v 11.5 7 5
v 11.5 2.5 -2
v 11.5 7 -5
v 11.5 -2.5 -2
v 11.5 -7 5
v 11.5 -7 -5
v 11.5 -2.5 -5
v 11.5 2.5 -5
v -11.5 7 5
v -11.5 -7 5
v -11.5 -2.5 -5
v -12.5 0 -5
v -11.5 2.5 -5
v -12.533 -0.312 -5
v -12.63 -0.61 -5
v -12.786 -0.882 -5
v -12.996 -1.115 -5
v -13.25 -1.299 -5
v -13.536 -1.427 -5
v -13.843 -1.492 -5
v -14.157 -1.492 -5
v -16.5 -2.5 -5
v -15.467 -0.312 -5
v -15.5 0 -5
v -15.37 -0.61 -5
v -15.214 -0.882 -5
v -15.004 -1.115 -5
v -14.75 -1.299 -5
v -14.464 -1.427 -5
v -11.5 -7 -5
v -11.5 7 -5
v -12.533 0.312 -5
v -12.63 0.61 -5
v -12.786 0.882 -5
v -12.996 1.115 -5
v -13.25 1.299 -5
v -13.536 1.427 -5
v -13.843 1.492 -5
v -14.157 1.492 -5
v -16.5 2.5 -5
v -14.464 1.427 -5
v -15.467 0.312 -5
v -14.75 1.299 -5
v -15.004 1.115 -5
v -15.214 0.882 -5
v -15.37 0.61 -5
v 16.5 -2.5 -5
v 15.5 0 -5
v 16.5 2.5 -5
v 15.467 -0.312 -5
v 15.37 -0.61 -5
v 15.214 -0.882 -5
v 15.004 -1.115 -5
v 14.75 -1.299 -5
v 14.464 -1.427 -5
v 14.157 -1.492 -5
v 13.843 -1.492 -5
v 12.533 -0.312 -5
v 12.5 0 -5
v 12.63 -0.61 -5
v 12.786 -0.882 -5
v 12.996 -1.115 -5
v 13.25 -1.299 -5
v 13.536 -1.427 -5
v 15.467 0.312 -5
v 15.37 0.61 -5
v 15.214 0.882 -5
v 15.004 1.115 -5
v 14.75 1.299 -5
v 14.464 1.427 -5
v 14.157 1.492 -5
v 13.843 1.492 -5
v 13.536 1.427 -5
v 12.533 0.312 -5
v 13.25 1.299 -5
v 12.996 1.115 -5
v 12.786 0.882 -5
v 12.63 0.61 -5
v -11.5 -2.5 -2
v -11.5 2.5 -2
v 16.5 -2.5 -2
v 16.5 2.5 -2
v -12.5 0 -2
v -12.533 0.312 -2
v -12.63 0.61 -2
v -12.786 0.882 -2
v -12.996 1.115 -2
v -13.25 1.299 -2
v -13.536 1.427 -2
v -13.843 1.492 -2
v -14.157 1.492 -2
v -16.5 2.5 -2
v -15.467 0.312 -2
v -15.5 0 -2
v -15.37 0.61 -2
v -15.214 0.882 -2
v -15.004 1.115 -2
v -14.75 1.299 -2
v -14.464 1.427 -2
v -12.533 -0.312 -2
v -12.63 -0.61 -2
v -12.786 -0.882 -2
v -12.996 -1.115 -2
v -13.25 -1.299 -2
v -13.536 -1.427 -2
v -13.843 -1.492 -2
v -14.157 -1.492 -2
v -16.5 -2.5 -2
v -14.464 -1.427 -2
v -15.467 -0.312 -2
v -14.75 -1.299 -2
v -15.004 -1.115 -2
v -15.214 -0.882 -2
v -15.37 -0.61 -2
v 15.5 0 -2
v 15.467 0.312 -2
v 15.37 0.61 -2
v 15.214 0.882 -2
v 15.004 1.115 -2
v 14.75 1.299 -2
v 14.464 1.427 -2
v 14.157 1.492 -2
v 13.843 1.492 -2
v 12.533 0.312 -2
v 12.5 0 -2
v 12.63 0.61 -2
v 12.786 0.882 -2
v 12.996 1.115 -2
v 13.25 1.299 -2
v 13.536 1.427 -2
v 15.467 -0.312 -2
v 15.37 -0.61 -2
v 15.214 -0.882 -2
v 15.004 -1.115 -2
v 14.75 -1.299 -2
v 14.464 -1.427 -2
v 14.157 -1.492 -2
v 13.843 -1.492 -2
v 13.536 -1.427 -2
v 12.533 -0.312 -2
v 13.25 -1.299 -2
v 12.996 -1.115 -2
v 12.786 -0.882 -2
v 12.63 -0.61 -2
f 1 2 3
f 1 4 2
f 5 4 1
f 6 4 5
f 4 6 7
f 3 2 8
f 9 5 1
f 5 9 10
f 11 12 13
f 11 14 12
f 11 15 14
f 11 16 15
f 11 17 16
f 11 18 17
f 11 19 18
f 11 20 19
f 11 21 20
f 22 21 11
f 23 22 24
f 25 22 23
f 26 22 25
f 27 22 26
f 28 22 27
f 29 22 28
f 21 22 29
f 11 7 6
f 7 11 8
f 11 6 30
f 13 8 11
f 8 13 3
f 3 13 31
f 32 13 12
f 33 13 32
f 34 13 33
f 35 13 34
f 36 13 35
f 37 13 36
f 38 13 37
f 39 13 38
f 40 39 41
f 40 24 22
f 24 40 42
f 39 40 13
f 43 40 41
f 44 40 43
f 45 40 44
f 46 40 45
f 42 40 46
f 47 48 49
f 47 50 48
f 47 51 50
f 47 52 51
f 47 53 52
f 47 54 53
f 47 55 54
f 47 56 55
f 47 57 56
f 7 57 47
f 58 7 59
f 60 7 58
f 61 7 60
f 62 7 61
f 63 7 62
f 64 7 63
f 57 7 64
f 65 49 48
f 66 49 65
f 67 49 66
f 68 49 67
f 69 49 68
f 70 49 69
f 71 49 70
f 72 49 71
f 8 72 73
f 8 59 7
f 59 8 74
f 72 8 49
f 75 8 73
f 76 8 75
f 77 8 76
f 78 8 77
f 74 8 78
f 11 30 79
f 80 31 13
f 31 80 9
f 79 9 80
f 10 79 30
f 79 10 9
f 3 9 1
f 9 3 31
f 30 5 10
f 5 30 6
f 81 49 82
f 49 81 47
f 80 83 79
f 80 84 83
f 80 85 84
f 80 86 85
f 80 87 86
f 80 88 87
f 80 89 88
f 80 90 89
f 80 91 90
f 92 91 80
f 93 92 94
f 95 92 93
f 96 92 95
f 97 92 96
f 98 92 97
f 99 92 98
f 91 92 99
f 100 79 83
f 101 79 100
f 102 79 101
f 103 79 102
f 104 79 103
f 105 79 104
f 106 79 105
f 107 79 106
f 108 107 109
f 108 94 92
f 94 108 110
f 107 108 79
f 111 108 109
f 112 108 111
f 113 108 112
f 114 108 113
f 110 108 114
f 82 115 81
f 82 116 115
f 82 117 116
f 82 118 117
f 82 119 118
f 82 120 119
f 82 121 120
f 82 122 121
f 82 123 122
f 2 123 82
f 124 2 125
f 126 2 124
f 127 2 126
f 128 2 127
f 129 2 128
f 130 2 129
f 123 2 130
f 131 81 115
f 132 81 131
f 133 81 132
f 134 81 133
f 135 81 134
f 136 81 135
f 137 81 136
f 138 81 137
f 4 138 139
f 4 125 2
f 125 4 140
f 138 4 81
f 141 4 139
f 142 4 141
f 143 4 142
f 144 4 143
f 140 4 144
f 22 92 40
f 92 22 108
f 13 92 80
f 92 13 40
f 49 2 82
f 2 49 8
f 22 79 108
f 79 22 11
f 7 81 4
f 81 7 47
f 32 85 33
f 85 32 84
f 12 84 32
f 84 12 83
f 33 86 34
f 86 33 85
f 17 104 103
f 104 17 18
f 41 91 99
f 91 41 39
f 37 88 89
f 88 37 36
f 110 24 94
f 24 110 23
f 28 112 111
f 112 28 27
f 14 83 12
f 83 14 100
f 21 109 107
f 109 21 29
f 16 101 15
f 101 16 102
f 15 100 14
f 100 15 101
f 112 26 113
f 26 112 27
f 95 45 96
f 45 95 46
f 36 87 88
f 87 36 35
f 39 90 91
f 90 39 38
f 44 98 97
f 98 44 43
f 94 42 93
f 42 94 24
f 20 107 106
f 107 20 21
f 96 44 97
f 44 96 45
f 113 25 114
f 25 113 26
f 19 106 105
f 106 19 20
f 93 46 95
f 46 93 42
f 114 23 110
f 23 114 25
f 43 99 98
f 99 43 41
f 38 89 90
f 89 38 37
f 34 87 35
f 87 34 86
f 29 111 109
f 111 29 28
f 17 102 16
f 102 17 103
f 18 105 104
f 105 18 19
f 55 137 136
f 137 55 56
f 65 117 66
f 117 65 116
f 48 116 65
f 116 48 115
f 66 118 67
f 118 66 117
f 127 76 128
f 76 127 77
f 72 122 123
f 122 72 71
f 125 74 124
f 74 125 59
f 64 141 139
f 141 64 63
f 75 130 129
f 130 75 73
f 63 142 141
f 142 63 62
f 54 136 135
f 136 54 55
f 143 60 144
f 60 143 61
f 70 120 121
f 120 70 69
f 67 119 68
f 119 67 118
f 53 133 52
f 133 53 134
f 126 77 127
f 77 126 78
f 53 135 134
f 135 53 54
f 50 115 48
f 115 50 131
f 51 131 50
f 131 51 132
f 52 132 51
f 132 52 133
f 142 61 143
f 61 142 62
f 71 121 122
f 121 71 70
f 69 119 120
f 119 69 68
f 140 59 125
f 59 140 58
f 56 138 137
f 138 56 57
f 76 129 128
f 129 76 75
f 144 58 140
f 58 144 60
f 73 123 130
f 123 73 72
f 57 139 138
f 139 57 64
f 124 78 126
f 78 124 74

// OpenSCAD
// file: openbeam.scad
IN_MM = 25.4;
$fn = 32;

wall_th = 2;

beam_w = 15;
beam_notch_d = 5;
beam_notch_w = 3;
beam_hole_or = 3/2;

module beam(length=50) {
    translate([0, 0, -length/2])
    linear_extrude(length) {
        difference() {
            square([beam_w, beam_w], center=true);
            for (i=[0:3]) {
                rotate([0, 0, 90 * i]) {
                    translate([beam_w/2 - beam_notch_d / 2, 0, 0]) {
                        square([beam_notch_d, beam_notch_w], center=true);
                    }
                }
            }
            //circle(r=beam_hole_or);
        }
    }
}

module mount_block(ir) {
    block_outside = 2*ir + 2 * wall_th;
    difference() {
        union() {
            translate([0, 0, wall_th/2])
                cube([3 * beam_w, beam_w, wall_th], center=true);
            translate([0, 0, block_outside/4])
                cube([block_outside, beam_w, block_outside/2], center=true);
            translate([0, 0, ir + wall_th])
                rotate([90, 0, 0]) 
                cylinder(r=block_outside/2, h=beam_w, center=true);
            * translate([ir + wall_th, 0, sqrt(2)/4*block_brace_w + wall_th/2])
                rotate([0, 45, 0])
                cube([block_brace_w, beam_w, block_brace_w/2], center=true);
            * translate([-ir - wall_th, 0, sqrt(2)/4*block_brace_w + wall_th/2])
                rotate([0, -45, 0])
                cube([block_brace_w, beam_w, block_brace_w/2], center=true);
            translate([-ir - wall_th + 1, -beam_w/2 + block_brace_w/4, sqrt(2)/4*block_brace_w])
                rotate([0, -45, 0])
                cube([beam_w, block_brace_w/2, beam_w], center=true);
            * translate([-ir - wall_th + 1, beam_w/2 - block_brace_w/4, sqrt(2)/4*block_brace_w])
                rotate([0, -45, 0])
                cube([beam_w, block_brace_w/2, beam_w], center=true);
            translate([ir + wall_th - 1, -beam_w/2 + block_brace_w/4, sqrt(2)/4*block_brace_w])
                rotate([0, 45, 0])
                cube([beam_w, block_brace_w/2, beam_w], center=true);
            * translate([ir + wall_th - 1, beam_w/2 - block_brace_w/4, sqrt(2)/4*block_brace_w])
                rotate([0, 45, 0])
                cube([beam_w, block_brace_w/2, beam_w], center=true);
        }
        translate([0, 0, ir + wall_th])
            rotate([90, 0, 0]) 
            cylinder(r=ir, h=beam_w+1, center=true, $fn=64);
        translate([beam_w, 0, 0])
            cylinder(r=beam_hole_or, h=wall_th*2);
        translate([-beam_w, 0, 0])
            cylinder(r=beam_hole_or, h=wall_th*2);
        
        translate([0, 0, -beam_w/2])
            cube([3*beam_w + 1, beam_w + 1, beam_w], center=true);
    }
}

bearing_h = 7;
bearing_ir = 4;
bearing_or = 11;
block_brace_w = 5;
module pillow_block() {
   mount_block(bearing_or);
}

module corner_mount() {
    difference() {
        cube(2*beam_w, center=true);
        
        translate([0, 0, 0])
            beam(beam_w*2);
        * translate([0, 0, -beam_w])
            beam(beam_w);
        translate([0, 0, 0])
            rotate([90, 0, 0])
            beam(beam_w*2);
        * translate([0, -beam_w, 0])
            rotate([90, 0, 0])
            beam(beam_w);
        translate([0, 0, 0])
            rotate([0, 90, 0])
            beam(beam_w*2);
        * translate([-beam_w, 0, 0])
            rotate([0, 90, 0])
            beam(beam_w);
    }
}

corner_mount();
// main file
use <openbeam.scad>;
IN_MM = 25.4;

/////////////////////////////////////////////////
//////////// PURCHASED PARTS ////////////////////
/////////////////////////////////////////////////

openbeam_w = 15;
BEAM_IR = 3/2;

mower_shaft_or = 25 / 2;
mower_shaft_l = 32 * IN_MM;
mower_blade_or = 12 * IN_MM / 2;
mower_blade_h = 3 * IN_MM;
mower_neck_angle = 45;
mower_neck_or = 2 * IN_MM;
mower_neck_shaft_l = 7.5 * IN_MM;
mower_neck_h = 5.5 * IN_MM;
mower_neck_offset_h = 1.0 * IN_MM;

module mower() {
    translate([0, 0, -mower_neck_shaft_l])
        cylinder(r=mower_shaft_or, h=mower_shaft_l);
    translate([0, 0, -mower_neck_shaft_l]) {
                rotate([0, -mower_neck_angle, 0]) {
                    translate([0, 0, -mower_blade_h - mower_neck_offset_h]) {
                        cylinder(r=mower_blade_or, h=mower_blade_h);
                        cylinder(r=mower_neck_or, h=mower_blade_h+mower_neck_h);
                    }
                }
            }
}

/////////////////////////////////////////////////
//////////// ROD+SHAFT+NEMA /////////////////////
/////////////////////////////////////////////////

rod_r = 8 / 2;
rod_l = 500;
sk8_c_h = 20;
sk8_flange_w = 42;
sk8_flange_h = 6.5;
sk8_w = 20;
sk8_l = 14;
sk8_h = 33.5;
sk8_hole_r = 5.5 / 2;
sk8_hole_c_c = 31.5;

module rod(l=rod_l) {
    rotate([0, 90, 0])
        cylinder(r=rod_r, h=l);
}

module sk8() {
    difference() {
        union() {
            translate([-sk8_l / 2, -sk8_w / 2, -sk8_c_h])
                cube([sk8_l, sk8_w, sk8_h]);
            translate([-sk8_l / 2, -sk8_flange_w / 2, -sk8_c_h]) 
                cube([sk8_l, sk8_flange_w, sk8_flange_h]);
        }
        translate([-sk8_l / 2, 0, 0])
            rod(sk8_l);
        translate([0, sk8_hole_c_c / 2, -sk8_c_h])
            cylinder(r=sk8_hole_r, h=sk8_flange_h);
        translate([0, -sk8_hole_c_c / 2, -sk8_c_h])
            cylinder(r=sk8_hole_r, h=sk8_flange_h);
    }
}

rod_traveller_w = 34;
rod_traveller_l = 30;
rod_traveller_h = 21.7;
rod_traveller_step_h = 17;
rod_traveller_step_w = 17;
rod_traveller_hole_c_c_w = 24.5;
rod_traveller_hole_c_c_l = 18;
rod_traveller_hole_r = 4 / 2;

rod_traveller_mount_h = 4 * rod_traveller_hole_r;

module rod_traveller() {
    difference() {
        translate([-rod_traveller_l/2, -rod_traveller_w/2, -rod_traveller_h/2])
            cube([rod_traveller_l, rod_traveller_w, rod_traveller_h]);
        translate([-rod_traveller_l/2, 0, 0])
            rod(rod_traveller_l);
        
        translate([-rod_traveller_hole_c_c_l/2, -rod_traveller_hole_c_c_w/2, -rod_traveller_h/2])
            cylinder(r=rod_traveller_hole_r, h=rod_traveller_h);
        translate([-rod_traveller_hole_c_c_l/2, rod_traveller_hole_c_c_w/2, -rod_traveller_h/2])
            cylinder(r=rod_traveller_hole_r, h=rod_traveller_h);
        translate([rod_traveller_hole_c_c_l/2, rod_traveller_hole_c_c_w/2, -rod_traveller_h/2])
            cylinder(r=rod_traveller_hole_r, h=rod_traveller_h);
        translate([rod_traveller_hole_c_c_l/2, -rod_traveller_hole_c_c_w/2, -rod_traveller_h/2])
            cylinder(r=rod_traveller_hole_r, h=rod_traveller_h);
         translate([-rod_traveller_l/2, -rod_traveller_w / 2, -rod_traveller_h / 2 + rod_traveller_step_h])
            cube([rod_traveller_l, (rod_traveller_w - rod_traveller_step_w) / 2, rod_traveller_h - rod_traveller_step_h]);
        translate([-rod_traveller_l/2, (rod_traveller_w - rod_traveller_step_w) / 2, -rod_traveller_h / 2 + rod_traveller_step_h])
            cube([rod_traveller_l, (rod_traveller_w - rod_traveller_step_w) / 2, rod_traveller_h - rod_traveller_step_h]);
    }
}

module rod_traveller_mount_holes(h=rod_traveller_mount_h) {
    translate([-rod_traveller_hole_c_c_l/2, -  rod_traveller_hole_c_c_w/2, -h/2])
            cylinder(r=rod_traveller_hole_r, h=h);
        translate([-rod_traveller_hole_c_c_l/2, rod_traveller_hole_c_c_w/2, -h/2])
            cylinder(r=rod_traveller_hole_r, h=h);
        translate([rod_traveller_hole_c_c_l/2, rod_traveller_hole_c_c_w/2, -h/2])
            cylinder(r=rod_traveller_hole_r, h=h);
        translate([rod_traveller_hole_c_c_l/2, -rod_traveller_hole_c_c_w/2, -h/2])
            cylinder(r=rod_traveller_hole_r, h=h);
}

shaft_r = 8 / 2;
shaft_l = 400;
kp08_l = 13;
kp08_c_h = 14.5;
kp08_h = 30;
kp08_w = 2 * kp08_c_h;
kp08_flange_w = 55;
kp08_hole_r = 5 / 2;
kp08_hole_c_c = 42;
kp08_flange_h = 5;

module shaft(l=shaft_l) {
    rod(l);
}

module kp08() {
    difference() {
        union() {
            translate([-kp08_l/2, 0, 0])
                rotate([0, 90, 0])
                    cylinder(r=kp08_w/2, h=kp08_l);
            translate([-kp08_l/2, -kp08_flange_w/2, -kp08_c_h])
                cube([kp08_l, kp08_flange_w, kp08_flange_h]);
        }
        shaft(kp08_l);
        translate([0, kp08_hole_c_c/2, -kp08_c_h])
            cylinder(r=kp08_hole_r, h=kp08_flange_h);
        translate([0, - kp08_hole_c_c/2, -kp08_c_h])
            cylinder(r=kp08_hole_r, h=kp08_flange_h);
    }
}

traveller_h = 16;
traveller_collar_or = 11 / 2;
traveller_flange_or = 23 / 2;
traveller_flange_h = 3.75;
traveller_flange_z = 10.2;
traveller_hole_ir = 3.7 / 2;
traveller_hole_offset = 8;
traveller_num_holes = 4;
traveller_hole_angle = 360 / traveller_num_holes;
traveller_ir = 7 / 2;

gimbal_shift_z = -traveller_flange_z/2 + traveller_flange_h / 2;

module shaft_traveller() {
     //translate([0, 0, gimbal_l / 2 - traveller_flange_z / 2 + gimbal_shift_z])
        difference() {
        union() {
            cylinder(h=traveller_h, r=traveller_collar_or);
            translate([0, 0, traveller_flange_z]) {
                difference() {
                    cylinder(h=traveller_flange_h, r=traveller_flange_or);
                    for (i=[1:traveller_num_holes])
                        rotate([0, 0, i * traveller_hole_angle])
                            translate([traveller_hole_offset, 0, 0])
                                cylinder(h=traveller_flange_h, r=traveller_hole_ir);
                }
            }
        }
        cylinder(h=traveller_h, r=traveller_ir);
    }
}

nema_mount_flange_h = 3;
nema_mount_w = 50;
nema_mount_l = 50 + nema_mount_flange_h;
nema_mount_h = 51.5;
nema_mount_c_h = 30;
nema_slot_l = 35;
nema_slot_iw = 25.6;
nema_slot_ow = 34.4;
nema_mount_slot_c_c = (nema_slot_iw + nema_slot_ow) / 2;
nema_slot_w = (nema_slot_ow - nema_slot_iw) / 2;
//nema_collar_l = 35;
nema_collar_l_offset = 6;
nema_collar_l_coupler = 25;
nema_collar_l = (
    nema_collar_l_coupler + 
    nema_collar_l_offset + 
    nema_mount_flange_h);
nema_collar_or = 20 / 2;
nema_l = 48;
nema_w = 43;

module nema_mount() {
    difference() {
        union() {
            translate([0, -nema_mount_w / 2, -nema_mount_c_h]) {
                cube([nema_mount_flange_h, nema_mount_w, nema_mount_h]);
                cube([nema_mount_l, nema_mount_w, nema_mount_flange_h]);
            }
            translate([nema_collar_l_offset, 0, 0])
            rotate([0, 90, 0])
                cylinder(r=nema_collar_or, h=nema_collar_l_coupler);
        }
        shaft(nema_mount_flange_h);
        translate([(nema_mount_l - nema_slot_l)/2, nema_mount_slot_c_c/2 - nema_slot_w/2, -nema_mount_c_h])
            cube([nema_slot_l, nema_slot_w, nema_mount_flange_h]);
        translate([(nema_mount_l - nema_slot_l)/2, -nema_mount_slot_c_c/2 - nema_slot_w/2, -nema_mount_c_h])
            cube([nema_slot_l, nema_slot_w, nema_mount_flange_h]);
        rod(nema_collar_l);
    }
    % translate([-nema_l, -nema_w/2, -nema_w/2])
        cube([nema_l, nema_w, nema_w]);
}

bar_w = 1.0 * IN_MM;

module bar(length) {
    cube([length, bar_w, bar_w], center=true);
}

function get_sk8_c_h() = sk8_c_h;
function get_sk8_flange_w() = sk8_flange_w;
function get_sk8_l() = sk8_l;
function get_rod_r() = rod_r;
function get_shaft_l() = shaft_l;

$fn=30;
PI = 3.14159;

IN_MM = 25.4;


motor_short_c_c = 56;
motor_short_offset = 0.9 * IN_MM;
motor_long_c_c = 72;
motor_long_offset = 1.75 * IN_MM;
motor_collar_or = 1 * IN_MM / 2;
motor_hole_ir = 3;
motor_post_or = 0.5 * IN_MM / 2;
motor_hole_depth = 0.8 * IN_MM;
motor_post_depth = 1.5 * IN_MM;
motor_collar_h = 1.4 * IN_MM;
motor_post_to_sprocket_h = 2.0 * IN_MM;
motor_shaft_or = 0.5 * IN_MM / 2;
motor_or = 2.4 * IN_MM / 2;
motor_depth = 4.5 * IN_MM;
motor_gearbox_w = 3 * IN_MM;
motor_gearbox_depth = 2 * IN_MM;
motor_gearbox_l = 3.4 * IN_MM;
motor_sprocket_h = 0.3 * IN_MM;
motor_sprocket_or = 1.8 * IN_MM / 2;

function get_motor_tall_rotation() = atan(motor_short_c_c/2 / (motor_short_offset + motor_long_offset));

module motor_post() {
    // difference() {
      //  cylinder(h=motor_post_depth, r=motor_post_or);
        translate([0, 0, motor_post_depth - motor_hole_depth])
            cylinder(r=motor_hole_ir, h=motor_hole_depth);
    //}
}

module drive_motor(use_stl=false) {
    if (use_stl) {
        import("drive_motor.stl");
    } else {
        translate([0, 0, -motor_post_to_sprocket_h]) {
            difference() {
                union() {
                    cylinder(r=motor_collar_or, h=motor_collar_h);
                    cylinder(r=motor_shaft_or, h=motor_post_to_sprocket_h);
            
                    translate([-motor_short_c_c/2, motor_or, -motor_or])
                    rotate([0, -90, 0])
                        cylinder(r=motor_or, h=motor_depth);
                    translate([-motor_short_c_c/2 - motor_post_or, motor_long_offset - motor_gearbox_l, -motor_gearbox_depth])
                    cube([motor_gearbox_w, motor_gearbox_l, motor_gearbox_depth]);
                    translate([0, motor_long_offset, -motor_post_depth])
                        cylinder(h=motor_post_depth, r=motor_post_or);
                }
                translate([0, motor_long_offset, -motor_post_depth])
                    motor_post();
                translate([-motor_short_c_c/2, -motor_short_offset, -motor_post_depth])
                    motor_post();
                translate([motor_short_c_c/2, -motor_short_offset, -motor_post_depth])
                    motor_post();
            }
        }
    }
}

volt_disp_w = 14;
volt_disp_l = 23;
volt_disp_h = 10;
volt_disp_tab_lw = 5;
volt_disp_tab_h = 3;
volt_disp_tab_hole_ir = 3 / 2;

module volt_disp() {
    difference() {
        union() {
            cube([volt_disp_l, volt_disp_w, volt_disp_h], center=true);
            translate([0, 0, (volt_disp_tab_h - volt_disp_h) / 2]) 
                cube([
                    volt_disp_l + 2 * volt_disp_tab_lw,
                    volt_disp_tab_lw,
                    volt_disp_tab_h], center=true);
        }
        volt_disp_holes();
    }
}

module volt_disp_holes() {
    for (i=[-1, 1]) {
        translate([i* (volt_disp_l + volt_disp_tab_lw)/2, 0, 0])
            cylinder(r=volt_disp_tab_hole_ir, h=2*volt_disp_h, center=true);
    }
}

module volt_disp_holder() {
    volt_disp();
    % translate([0, 0, -openbeam_w/2])
        rotate([0, 90, 0])
        beam();
    
}
volt_disp_holder();
